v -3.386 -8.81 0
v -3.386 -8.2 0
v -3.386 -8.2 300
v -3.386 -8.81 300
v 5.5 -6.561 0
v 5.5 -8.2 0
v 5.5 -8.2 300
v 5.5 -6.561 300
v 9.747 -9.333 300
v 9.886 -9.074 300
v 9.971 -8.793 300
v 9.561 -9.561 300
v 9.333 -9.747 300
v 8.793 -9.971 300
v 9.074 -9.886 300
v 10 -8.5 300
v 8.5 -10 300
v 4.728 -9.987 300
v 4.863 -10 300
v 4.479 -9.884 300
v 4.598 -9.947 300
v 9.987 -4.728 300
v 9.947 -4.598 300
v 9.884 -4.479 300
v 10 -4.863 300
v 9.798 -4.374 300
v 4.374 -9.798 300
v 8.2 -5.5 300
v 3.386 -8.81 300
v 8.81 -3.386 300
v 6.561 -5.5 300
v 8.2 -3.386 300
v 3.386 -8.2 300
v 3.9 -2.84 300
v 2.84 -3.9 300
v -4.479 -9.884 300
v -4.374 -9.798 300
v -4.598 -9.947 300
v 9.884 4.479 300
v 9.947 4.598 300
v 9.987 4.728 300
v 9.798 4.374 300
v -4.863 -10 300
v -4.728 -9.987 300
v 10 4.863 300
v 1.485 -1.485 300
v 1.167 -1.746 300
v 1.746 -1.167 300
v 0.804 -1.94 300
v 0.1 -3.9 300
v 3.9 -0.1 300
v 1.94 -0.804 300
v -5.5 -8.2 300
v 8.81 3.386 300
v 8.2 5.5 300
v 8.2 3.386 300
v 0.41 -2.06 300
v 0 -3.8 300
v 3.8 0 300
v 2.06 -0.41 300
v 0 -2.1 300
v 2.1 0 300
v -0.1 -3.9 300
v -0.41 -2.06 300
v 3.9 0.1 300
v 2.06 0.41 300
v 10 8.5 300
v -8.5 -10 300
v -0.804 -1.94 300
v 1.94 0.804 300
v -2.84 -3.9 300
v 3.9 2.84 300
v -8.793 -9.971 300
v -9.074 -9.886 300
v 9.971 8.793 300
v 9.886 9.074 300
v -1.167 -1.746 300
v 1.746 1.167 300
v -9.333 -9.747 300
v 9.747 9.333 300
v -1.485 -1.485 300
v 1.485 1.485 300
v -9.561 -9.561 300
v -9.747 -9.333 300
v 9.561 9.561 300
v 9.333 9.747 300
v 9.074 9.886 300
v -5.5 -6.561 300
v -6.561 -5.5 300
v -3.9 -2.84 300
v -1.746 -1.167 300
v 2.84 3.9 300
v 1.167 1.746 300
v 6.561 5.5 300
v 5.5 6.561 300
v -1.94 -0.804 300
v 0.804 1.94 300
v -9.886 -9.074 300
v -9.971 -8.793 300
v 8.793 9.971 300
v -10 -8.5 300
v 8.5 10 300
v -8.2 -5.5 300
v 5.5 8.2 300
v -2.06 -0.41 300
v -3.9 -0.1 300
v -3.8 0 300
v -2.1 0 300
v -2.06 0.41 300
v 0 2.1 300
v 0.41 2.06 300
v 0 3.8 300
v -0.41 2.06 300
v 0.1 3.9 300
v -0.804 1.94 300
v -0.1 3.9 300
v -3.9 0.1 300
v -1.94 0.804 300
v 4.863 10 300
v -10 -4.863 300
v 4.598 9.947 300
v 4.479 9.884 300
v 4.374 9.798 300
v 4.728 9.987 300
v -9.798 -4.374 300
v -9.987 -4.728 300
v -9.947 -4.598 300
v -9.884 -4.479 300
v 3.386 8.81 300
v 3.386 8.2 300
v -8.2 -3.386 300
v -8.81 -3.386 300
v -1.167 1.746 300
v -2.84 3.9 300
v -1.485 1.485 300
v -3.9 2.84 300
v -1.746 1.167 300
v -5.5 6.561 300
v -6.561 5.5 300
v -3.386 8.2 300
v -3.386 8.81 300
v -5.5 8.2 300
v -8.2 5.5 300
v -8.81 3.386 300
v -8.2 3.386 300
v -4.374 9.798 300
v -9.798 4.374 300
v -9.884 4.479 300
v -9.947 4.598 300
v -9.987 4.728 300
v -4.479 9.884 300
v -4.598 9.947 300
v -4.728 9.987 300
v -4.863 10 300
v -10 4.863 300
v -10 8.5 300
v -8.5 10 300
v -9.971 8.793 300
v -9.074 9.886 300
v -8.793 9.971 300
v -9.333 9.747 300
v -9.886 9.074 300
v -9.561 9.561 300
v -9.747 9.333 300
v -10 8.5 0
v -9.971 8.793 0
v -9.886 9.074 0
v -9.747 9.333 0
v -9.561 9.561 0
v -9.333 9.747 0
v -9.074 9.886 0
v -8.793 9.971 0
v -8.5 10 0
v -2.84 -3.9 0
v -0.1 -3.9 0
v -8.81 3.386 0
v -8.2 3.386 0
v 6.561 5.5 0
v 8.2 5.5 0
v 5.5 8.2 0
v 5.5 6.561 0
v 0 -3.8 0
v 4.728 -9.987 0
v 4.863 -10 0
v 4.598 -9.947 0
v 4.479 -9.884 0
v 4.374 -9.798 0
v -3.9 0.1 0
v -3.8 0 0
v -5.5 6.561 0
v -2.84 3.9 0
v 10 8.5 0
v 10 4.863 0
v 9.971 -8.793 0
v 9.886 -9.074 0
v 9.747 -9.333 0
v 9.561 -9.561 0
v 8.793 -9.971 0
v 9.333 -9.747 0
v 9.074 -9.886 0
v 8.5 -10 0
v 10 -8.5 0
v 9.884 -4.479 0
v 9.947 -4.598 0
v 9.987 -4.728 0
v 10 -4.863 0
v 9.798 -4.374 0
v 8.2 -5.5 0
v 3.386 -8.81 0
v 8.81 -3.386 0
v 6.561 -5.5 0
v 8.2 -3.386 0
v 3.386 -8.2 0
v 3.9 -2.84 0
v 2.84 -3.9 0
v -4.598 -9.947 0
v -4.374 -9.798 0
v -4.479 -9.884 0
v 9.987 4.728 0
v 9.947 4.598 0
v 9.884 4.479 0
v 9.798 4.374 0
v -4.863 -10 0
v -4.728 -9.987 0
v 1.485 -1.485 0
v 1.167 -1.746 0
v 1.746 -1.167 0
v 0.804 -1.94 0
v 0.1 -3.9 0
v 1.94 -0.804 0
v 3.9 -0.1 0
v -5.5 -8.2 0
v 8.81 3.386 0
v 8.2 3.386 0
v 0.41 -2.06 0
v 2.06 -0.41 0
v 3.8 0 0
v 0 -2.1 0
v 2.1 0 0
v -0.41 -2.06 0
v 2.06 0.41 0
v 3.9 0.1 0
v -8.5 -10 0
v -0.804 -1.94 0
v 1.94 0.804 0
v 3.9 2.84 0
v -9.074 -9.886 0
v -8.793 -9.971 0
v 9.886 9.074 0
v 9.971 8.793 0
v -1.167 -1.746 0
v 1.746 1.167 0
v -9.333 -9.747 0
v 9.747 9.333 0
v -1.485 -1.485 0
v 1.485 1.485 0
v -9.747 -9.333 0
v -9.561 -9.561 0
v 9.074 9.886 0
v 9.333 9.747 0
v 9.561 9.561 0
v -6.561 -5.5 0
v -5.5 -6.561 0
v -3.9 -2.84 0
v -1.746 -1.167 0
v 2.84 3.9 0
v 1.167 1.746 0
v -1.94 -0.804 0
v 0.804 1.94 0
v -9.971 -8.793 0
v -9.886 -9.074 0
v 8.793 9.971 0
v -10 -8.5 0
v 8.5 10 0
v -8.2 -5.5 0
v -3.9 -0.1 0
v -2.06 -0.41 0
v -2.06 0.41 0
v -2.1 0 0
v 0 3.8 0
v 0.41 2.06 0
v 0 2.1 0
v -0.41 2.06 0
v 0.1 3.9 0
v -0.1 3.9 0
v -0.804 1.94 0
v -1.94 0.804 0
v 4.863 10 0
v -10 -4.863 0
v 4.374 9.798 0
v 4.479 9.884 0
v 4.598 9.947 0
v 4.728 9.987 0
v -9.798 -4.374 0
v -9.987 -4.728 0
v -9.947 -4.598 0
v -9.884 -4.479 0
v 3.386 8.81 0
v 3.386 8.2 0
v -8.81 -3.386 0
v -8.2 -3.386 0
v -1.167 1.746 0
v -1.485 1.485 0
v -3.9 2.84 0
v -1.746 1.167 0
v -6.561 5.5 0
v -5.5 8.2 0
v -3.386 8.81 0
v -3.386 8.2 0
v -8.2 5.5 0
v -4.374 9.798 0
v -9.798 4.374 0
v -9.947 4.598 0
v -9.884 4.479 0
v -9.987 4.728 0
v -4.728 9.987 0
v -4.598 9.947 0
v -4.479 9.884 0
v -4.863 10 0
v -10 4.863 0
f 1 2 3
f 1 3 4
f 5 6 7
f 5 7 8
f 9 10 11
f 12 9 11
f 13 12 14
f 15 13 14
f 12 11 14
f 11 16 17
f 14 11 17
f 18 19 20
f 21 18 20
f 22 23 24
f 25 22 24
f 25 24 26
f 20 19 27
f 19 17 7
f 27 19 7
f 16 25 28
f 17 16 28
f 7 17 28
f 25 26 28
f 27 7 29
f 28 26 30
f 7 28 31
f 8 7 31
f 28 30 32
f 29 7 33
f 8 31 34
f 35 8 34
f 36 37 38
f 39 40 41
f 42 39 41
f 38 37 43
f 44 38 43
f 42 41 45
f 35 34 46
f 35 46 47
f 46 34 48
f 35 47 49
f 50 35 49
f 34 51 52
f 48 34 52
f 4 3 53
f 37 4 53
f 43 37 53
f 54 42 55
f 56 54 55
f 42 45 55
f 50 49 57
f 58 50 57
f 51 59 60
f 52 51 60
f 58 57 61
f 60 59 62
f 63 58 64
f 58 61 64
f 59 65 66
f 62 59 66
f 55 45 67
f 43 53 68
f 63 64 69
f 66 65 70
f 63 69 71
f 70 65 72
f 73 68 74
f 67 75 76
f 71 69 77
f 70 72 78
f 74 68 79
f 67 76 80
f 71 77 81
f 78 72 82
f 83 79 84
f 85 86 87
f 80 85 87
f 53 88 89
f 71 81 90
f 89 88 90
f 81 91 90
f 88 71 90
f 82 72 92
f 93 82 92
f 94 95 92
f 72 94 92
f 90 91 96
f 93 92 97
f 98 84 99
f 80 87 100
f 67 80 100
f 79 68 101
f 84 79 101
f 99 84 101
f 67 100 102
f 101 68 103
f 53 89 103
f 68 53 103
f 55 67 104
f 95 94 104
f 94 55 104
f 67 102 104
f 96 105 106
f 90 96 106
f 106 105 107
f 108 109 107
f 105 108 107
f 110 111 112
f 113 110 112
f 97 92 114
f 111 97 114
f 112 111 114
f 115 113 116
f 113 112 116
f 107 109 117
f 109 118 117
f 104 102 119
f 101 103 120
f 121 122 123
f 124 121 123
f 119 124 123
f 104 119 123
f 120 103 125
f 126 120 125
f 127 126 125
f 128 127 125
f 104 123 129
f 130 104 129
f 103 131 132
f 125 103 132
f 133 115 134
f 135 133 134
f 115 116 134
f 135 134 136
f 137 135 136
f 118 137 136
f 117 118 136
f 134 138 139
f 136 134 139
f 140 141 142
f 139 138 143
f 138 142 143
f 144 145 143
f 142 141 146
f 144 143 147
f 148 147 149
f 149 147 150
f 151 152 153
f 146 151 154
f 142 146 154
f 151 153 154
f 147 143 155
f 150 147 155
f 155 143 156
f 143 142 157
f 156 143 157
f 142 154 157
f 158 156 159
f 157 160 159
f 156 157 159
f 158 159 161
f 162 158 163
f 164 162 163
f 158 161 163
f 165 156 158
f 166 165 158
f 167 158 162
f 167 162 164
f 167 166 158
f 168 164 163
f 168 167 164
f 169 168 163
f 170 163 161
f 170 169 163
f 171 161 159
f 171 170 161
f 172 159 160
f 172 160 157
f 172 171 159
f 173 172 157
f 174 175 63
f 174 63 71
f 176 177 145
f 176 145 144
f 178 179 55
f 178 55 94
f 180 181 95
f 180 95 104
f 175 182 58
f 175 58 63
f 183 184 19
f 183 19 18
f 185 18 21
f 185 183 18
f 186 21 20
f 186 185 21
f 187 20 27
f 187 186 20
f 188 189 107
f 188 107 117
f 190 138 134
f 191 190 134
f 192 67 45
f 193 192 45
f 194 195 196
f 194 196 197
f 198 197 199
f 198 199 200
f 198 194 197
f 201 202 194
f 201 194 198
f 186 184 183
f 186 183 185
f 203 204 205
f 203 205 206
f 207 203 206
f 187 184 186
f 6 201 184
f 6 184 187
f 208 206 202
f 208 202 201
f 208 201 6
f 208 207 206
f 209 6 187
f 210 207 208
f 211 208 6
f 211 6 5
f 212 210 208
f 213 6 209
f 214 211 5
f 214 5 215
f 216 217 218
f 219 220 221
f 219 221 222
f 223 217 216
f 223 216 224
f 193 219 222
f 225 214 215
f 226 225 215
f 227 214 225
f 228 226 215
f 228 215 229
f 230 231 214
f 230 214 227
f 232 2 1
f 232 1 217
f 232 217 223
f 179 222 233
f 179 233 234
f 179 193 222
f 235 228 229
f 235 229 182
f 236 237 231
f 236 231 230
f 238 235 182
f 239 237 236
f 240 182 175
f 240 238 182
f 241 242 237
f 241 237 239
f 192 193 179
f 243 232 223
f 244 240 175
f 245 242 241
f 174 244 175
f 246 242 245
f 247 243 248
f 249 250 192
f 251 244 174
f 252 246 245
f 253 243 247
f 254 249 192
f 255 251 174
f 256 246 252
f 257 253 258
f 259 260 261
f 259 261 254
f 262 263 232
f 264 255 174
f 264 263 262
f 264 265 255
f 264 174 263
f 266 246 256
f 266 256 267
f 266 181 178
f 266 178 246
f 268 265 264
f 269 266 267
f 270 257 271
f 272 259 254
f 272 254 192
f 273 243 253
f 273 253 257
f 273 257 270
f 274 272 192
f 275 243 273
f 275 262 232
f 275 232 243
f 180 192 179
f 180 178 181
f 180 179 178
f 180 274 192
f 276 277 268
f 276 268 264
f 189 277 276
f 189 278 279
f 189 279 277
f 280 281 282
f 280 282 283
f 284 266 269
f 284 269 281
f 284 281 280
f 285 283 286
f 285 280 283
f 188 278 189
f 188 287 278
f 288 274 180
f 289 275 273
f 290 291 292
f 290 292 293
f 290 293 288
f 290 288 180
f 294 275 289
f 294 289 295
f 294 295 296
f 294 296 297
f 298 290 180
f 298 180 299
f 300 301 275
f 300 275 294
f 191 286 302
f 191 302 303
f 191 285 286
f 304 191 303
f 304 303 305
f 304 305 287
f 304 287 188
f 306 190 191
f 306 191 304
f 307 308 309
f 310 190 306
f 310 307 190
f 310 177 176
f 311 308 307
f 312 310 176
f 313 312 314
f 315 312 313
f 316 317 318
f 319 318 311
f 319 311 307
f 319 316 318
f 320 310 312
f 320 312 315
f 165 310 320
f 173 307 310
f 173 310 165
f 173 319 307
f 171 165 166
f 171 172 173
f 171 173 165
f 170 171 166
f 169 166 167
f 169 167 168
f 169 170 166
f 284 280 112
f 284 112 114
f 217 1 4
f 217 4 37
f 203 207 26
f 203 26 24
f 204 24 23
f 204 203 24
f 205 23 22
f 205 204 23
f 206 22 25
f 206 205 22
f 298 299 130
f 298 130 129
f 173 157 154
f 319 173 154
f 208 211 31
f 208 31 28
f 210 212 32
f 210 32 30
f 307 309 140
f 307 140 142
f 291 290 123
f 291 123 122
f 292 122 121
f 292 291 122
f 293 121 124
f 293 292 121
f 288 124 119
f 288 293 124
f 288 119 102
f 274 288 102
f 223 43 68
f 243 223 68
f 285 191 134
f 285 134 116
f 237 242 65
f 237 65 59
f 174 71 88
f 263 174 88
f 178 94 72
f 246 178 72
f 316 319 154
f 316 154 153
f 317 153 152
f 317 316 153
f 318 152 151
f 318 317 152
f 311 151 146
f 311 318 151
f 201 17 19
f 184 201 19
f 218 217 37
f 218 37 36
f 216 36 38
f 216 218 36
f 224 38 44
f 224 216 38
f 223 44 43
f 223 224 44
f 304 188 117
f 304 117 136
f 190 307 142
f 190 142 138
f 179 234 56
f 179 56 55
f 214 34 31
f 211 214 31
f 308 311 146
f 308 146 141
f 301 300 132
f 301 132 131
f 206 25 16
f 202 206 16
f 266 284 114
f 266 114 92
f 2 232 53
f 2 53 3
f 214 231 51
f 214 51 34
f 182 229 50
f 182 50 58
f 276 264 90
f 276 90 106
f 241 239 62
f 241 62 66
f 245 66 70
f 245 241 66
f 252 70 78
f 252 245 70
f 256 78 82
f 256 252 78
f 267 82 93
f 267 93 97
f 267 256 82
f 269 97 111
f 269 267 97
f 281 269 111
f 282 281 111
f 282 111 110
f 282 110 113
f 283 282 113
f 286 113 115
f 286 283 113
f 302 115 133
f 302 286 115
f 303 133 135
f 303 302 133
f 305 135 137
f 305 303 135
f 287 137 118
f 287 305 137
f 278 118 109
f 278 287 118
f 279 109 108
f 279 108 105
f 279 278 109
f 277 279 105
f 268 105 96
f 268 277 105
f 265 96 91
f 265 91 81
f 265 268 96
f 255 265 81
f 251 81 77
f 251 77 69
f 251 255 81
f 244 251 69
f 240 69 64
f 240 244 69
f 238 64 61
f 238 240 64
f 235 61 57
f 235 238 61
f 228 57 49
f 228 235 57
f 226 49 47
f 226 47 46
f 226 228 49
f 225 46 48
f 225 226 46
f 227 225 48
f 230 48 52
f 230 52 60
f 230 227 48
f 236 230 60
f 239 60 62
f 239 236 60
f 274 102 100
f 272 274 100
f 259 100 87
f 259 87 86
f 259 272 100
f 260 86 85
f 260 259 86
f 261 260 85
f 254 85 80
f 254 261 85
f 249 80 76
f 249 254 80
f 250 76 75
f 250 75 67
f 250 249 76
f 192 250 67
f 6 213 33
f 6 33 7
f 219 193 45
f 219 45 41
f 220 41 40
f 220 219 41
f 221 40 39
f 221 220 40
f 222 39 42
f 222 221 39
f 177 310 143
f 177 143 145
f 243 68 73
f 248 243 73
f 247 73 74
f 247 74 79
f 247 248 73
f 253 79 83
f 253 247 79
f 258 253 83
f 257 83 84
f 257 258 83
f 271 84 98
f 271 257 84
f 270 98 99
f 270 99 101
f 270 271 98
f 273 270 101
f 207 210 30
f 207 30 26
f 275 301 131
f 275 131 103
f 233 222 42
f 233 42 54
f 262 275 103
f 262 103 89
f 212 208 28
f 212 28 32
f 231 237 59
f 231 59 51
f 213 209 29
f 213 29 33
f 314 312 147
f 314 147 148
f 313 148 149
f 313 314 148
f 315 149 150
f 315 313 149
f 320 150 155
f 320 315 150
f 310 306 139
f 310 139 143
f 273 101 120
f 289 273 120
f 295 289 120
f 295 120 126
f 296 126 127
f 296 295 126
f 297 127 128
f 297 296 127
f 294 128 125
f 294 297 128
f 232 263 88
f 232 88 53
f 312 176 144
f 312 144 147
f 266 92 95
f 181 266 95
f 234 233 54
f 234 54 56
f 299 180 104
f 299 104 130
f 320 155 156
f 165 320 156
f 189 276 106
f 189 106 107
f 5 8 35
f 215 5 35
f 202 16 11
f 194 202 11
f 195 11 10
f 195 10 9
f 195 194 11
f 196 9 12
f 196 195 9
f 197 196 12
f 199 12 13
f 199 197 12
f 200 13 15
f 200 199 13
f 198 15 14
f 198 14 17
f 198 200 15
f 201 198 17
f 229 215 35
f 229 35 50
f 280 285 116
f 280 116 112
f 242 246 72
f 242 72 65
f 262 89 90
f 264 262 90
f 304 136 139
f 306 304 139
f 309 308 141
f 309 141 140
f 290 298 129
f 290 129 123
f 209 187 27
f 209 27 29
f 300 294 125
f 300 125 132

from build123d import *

# Parameters (mm, degrees)
SKETCH1_R           = 2.1
BOSS_EXTRUDE1_DEPTH = 300


with BuildPart() as part:
    # Sketch1 → Boss-Extrude1 (new body)
    with BuildSketch(Plane.XY):
        with BuildLine():
            Line((-8.5, 10), (-4.862792737, 10))
            ThreePointArc((-4.862792737, 10), (-4.598292737, 9.947387679), (-4.374060464, 9.797560464))
            Line((-4.374060464, 9.797560464), (-3.3865, 8.81))
            Line((-3.3865, 8.81), (-3.3865, 8.2))
            Line((-3.3865, 8.2), (-5.5, 8.2))
            Line((-5.5, 8.2), (-5.5, 6.561))
            Line((-5.5, 6.561), (-2.8395, 3.9005))
            Line((-2.8395, 3.9005), (-0.1, 3.9005))
            Line((-0.1, 3.9005), (0, 3.8005))
            Line((0, 3.8005), (0.1, 3.9005))
            Line((0.1, 3.9005), (2.8395, 3.9005))
            Line((2.8395, 3.9005), (5.5, 6.561))
            Line((5.5, 6.561), (5.5, 8.2))
            Line((5.5, 8.2), (3.3865, 8.2))
            Line((3.3865, 8.2), (3.3865, 8.81))
            Line((3.3865, 8.81), (4.374060464, 9.797560464))
            ThreePointArc((4.374060464, 9.797560464), (4.598292737, 9.947387679), (4.862792737, 10))
            Line((4.862792737, 10), (8.5, 10))
            ThreePointArc((8.5, 10), (9.560660172, 9.560660172), (10, 8.5))
            Line((10, 8.5), (10, 4.862792737))
            ThreePointArc((10, 4.862792737), (9.947387679, 4.598292737), (9.797560464, 4.374060464))
            Line((9.797560464, 4.374060464), (8.81, 3.3865))
            Line((8.81, 3.3865), (8.2, 3.3865))
            Line((8.2, 3.3865), (8.2, 5.5))
            Line((8.2, 5.5), (6.561, 5.5))
            Line((6.561, 5.5), (3.9005, 2.8395))
            Line((3.9005, 2.8395), (3.9005, 0.1))
            Line((3.9005, 0.1), (3.8005, 0))
            Line((3.8005, 0), (3.9005, -0.1))
            Line((3.9005, -0.1), (3.9005, -2.8395))
            Line((3.9005, -2.8395), (6.561, -5.5))
            Line((6.561, -5.5), (8.2, -5.5))
            Line((8.2, -5.5), (8.2, -3.3865))
            Line((8.2, -3.3865), (8.81, -3.3865))
            Line((8.81, -3.3865), (9.797560464, -4.374060464))
            ThreePointArc((9.797560464, -4.374060464), (9.947387679, -4.598292737), (10, -4.862792737))
            Line((10, -4.862792737), (10, -8.5))
            ThreePointArc((10, -8.5), (9.560660172, -9.560660172), (8.5, -10))
            Line((8.5, -10), (4.862792737, -10))
            ThreePointArc((4.862792737, -10), (4.598292737, -9.947387679), (4.374060464, -9.797560464))
            Line((4.374060464, -9.797560464), (3.3865, -8.81))
            Line((3.3865, -8.81), (3.3865, -8.2))
            Line((3.3865, -8.2), (5.5, -8.2))
            Line((5.5, -8.2), (5.5, -6.561))
            Line((5.5, -6.561), (2.8395, -3.9005))
            Line((2.8395, -3.9005), (0.1, -3.9005))
            Line((0.1, -3.9005), (0, -3.8005))
            Line((0, -3.8005), (-0.1, -3.9005))
            Line((-0.1, -3.9005), (-2.8395, -3.9005))
            Line((-2.8395, -3.9005), (-5.5, -6.561))
            Line((-5.5, -6.561), (-5.5, -8.2))
            Line((-5.5, -8.2), (-3.3865, -8.2))
            Line((-3.3865, -8.2), (-3.3865, -8.81))
            Line((-3.3865, -8.81), (-4.374060464, -9.797560464))
            ThreePointArc((-4.374060464, -9.797560464), (-4.598292737, -9.947387679), (-4.862792737, -10))
            Line((-4.862792737, -10), (-8.5, -10))
            ThreePointArc((-8.5, -10), (-9.560660172, -9.560660172), (-10, -8.5))
            Line((-10, -8.5), (-10, -4.862792737))
            ThreePointArc((-10, -4.862792737), (-9.947387679, -4.598292737), (-9.797560464, -4.374060464))
            Line((-9.797560464, -4.374060464), (-8.81, -3.3865))
            Line((-8.81, -3.3865), (-8.2, -3.3865))
            Line((-8.2, -3.3865), (-8.2, -5.5))
            Line((-8.2, -5.5), (-6.561, -5.5))
            Line((-6.561, -5.5), (-3.9005, -2.8395))
            Line((-3.9005, -2.8395), (-3.9005, -0.1))
            Line((-3.9005, -0.1), (-3.8005, 0))
            Line((-3.8005, 0), (-3.9005, 0.1))
            Line((-3.9005, 0.1), (-3.9005, 2.8395))
            Line((-3.9005, 2.8395), (-6.561, 5.5))
            Line((-6.561, 5.5), (-8.2, 5.5))
            Line((-8.2, 5.5), (-8.2, 3.3865))
            Line((-8.2, 3.3865), (-8.81, 3.3865))
            Line((-8.81, 3.3865), (-9.797560464, 4.374060464))
            ThreePointArc((-9.797560464, 4.374060464), (-9.947387679, 4.598292737), (-10, 4.862792737))
            Line((-10, 4.862792737), (-10, 8.5))
            ThreePointArc((-10, 8.5), (-9.560660172, 9.560660172), (-8.5, 10))
        make_face()
        Circle(SKETCH1_R, mode=Mode.SUBTRACT)
    extrude(amount=BOSS_EXTRUDE1_DEPTH)


solid = part.part
